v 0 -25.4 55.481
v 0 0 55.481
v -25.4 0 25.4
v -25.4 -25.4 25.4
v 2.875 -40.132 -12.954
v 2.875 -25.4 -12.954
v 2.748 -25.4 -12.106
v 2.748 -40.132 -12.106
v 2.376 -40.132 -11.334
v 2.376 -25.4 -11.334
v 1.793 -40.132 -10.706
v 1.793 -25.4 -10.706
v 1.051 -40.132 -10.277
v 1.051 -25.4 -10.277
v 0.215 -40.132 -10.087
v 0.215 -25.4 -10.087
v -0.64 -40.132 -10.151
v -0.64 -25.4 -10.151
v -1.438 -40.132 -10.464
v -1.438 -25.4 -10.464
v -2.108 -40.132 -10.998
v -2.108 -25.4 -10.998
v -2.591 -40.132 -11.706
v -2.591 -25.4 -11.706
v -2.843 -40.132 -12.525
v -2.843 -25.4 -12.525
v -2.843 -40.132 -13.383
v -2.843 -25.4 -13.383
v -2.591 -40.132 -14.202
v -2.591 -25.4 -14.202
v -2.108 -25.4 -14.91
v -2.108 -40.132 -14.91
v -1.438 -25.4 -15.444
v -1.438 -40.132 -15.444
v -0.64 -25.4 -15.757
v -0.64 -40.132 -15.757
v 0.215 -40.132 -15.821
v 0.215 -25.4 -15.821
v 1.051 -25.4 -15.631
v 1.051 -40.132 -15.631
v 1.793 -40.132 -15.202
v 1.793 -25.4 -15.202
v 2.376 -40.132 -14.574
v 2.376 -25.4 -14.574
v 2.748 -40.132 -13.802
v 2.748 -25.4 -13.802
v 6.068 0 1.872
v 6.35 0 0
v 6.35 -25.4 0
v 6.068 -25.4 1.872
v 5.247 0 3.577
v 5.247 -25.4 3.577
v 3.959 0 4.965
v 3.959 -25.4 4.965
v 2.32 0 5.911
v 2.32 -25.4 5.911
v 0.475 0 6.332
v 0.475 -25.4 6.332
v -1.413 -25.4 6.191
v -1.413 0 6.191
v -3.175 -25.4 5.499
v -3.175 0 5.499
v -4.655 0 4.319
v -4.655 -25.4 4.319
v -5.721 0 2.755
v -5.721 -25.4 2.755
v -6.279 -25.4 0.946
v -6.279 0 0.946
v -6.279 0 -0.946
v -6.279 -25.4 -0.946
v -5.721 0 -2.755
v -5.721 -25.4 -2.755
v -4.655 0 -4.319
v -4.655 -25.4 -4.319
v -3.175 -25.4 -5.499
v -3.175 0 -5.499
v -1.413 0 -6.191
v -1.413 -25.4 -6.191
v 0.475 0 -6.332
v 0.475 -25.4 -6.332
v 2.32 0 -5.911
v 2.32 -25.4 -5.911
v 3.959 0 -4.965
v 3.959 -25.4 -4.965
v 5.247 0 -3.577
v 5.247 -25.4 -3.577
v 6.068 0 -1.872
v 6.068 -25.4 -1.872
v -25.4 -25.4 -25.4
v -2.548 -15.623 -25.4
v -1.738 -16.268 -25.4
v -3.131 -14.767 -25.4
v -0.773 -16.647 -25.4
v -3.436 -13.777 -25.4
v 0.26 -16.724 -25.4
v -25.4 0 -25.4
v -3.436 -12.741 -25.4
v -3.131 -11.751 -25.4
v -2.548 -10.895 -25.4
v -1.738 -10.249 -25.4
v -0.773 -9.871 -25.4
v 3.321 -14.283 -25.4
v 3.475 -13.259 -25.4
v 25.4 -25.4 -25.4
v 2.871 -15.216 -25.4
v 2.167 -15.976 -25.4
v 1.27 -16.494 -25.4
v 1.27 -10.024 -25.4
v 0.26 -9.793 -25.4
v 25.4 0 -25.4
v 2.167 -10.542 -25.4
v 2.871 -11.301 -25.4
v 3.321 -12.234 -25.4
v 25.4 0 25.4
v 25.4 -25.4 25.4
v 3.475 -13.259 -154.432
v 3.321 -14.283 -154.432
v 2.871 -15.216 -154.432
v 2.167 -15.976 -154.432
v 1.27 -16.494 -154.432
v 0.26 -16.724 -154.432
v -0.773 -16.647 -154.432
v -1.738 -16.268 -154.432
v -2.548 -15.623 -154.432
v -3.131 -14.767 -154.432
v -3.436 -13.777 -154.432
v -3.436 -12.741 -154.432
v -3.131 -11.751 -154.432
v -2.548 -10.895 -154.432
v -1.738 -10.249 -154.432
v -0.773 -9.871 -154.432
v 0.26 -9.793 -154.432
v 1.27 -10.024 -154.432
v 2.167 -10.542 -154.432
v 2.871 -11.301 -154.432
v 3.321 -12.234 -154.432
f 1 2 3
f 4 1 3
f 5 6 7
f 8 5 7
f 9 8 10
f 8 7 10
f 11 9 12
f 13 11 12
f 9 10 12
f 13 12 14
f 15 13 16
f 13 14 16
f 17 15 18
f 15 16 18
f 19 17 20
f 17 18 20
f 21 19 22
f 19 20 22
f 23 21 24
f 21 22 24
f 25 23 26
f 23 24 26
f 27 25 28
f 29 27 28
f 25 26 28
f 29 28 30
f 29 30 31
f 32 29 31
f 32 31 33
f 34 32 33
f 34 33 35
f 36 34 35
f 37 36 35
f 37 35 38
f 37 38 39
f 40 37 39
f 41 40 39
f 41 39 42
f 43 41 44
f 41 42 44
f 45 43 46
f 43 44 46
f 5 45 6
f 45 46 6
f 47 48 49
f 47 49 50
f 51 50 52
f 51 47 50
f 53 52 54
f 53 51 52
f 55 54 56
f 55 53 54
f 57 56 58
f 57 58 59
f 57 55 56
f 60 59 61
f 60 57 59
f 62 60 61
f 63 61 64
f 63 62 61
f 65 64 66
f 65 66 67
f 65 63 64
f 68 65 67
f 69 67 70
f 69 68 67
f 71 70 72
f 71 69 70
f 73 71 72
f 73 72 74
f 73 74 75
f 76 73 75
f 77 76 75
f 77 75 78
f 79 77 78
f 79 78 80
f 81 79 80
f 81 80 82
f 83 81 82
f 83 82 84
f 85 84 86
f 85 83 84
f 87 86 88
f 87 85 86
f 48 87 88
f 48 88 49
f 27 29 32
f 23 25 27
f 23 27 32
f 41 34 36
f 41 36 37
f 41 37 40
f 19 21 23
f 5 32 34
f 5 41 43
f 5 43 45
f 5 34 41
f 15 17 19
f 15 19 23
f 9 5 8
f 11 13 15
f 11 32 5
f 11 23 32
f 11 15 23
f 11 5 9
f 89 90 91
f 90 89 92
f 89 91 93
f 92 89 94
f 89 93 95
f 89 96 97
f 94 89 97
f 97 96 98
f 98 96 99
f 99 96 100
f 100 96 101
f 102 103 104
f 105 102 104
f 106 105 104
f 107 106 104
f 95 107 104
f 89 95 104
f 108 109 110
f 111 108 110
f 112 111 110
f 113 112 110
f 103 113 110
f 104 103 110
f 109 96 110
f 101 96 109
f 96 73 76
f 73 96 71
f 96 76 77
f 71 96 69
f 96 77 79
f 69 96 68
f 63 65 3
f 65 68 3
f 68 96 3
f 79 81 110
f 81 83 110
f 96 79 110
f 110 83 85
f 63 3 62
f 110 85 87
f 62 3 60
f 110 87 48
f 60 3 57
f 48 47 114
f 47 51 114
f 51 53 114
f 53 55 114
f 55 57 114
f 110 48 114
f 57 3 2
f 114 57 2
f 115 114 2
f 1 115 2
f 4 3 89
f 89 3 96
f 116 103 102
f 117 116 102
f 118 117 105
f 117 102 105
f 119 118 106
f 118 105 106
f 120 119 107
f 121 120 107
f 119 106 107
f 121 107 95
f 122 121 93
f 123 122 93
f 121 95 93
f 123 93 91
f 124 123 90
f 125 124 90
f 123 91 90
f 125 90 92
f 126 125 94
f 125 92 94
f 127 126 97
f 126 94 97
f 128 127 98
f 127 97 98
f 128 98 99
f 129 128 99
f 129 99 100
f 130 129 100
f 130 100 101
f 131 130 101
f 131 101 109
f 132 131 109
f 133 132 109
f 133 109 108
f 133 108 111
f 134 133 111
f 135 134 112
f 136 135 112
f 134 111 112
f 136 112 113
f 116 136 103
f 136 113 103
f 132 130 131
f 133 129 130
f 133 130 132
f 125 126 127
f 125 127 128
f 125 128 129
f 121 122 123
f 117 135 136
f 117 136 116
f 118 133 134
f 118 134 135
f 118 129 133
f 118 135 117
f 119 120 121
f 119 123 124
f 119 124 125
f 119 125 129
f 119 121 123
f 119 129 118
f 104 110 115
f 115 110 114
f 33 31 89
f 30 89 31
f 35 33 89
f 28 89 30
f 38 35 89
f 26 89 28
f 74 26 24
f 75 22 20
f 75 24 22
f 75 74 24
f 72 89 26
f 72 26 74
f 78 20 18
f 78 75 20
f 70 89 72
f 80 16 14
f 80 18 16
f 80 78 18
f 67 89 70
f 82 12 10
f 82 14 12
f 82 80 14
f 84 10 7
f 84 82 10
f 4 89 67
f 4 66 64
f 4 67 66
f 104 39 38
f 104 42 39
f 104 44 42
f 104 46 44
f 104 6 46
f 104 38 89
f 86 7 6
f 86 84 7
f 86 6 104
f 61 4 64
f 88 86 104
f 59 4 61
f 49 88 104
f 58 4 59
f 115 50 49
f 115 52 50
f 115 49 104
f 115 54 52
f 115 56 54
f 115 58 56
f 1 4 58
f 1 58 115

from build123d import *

# Parameters (mm, degrees)
F0_R     = 6.35
F1_DEPTH = 25.4
F2_R     = 2.87548
F3_DEPTH = 14.732
F4_R     = 3.475255
F5_DEPTH = 129.032


with BuildPart() as f1:
    # F0 (on Front) → F1 (new body)
    with BuildSketch(Plane.XZ):
        Polygon((-25.4, -25.4), (25.4, -25.4), (25.4, 25.4), (0, 55.480507), (-25.4, 25.4), align=None)
        Circle(F0_R, mode=Mode.SUBTRACT)
    extrude(amount=F1_DEPTH)

    # F2 (on face) → F3 (join)
    with BuildSketch(Plane.XZ.offset(25.4)):
        with Locations((0, -12.954)):
            Circle(F2_R)
    extrude(amount=F3_DEPTH)

    # F4 (on face) → F5 (join)
    with BuildSketch(Plane(origin=(0, 0, -25.4), x_dir=(1, 0, 0), z_dir=(0, 0, -1))):
        with Locations((0, 13.2588)):
            Circle(F4_R)
    extrude(amount=F5_DEPTH)


solid = f1.part
